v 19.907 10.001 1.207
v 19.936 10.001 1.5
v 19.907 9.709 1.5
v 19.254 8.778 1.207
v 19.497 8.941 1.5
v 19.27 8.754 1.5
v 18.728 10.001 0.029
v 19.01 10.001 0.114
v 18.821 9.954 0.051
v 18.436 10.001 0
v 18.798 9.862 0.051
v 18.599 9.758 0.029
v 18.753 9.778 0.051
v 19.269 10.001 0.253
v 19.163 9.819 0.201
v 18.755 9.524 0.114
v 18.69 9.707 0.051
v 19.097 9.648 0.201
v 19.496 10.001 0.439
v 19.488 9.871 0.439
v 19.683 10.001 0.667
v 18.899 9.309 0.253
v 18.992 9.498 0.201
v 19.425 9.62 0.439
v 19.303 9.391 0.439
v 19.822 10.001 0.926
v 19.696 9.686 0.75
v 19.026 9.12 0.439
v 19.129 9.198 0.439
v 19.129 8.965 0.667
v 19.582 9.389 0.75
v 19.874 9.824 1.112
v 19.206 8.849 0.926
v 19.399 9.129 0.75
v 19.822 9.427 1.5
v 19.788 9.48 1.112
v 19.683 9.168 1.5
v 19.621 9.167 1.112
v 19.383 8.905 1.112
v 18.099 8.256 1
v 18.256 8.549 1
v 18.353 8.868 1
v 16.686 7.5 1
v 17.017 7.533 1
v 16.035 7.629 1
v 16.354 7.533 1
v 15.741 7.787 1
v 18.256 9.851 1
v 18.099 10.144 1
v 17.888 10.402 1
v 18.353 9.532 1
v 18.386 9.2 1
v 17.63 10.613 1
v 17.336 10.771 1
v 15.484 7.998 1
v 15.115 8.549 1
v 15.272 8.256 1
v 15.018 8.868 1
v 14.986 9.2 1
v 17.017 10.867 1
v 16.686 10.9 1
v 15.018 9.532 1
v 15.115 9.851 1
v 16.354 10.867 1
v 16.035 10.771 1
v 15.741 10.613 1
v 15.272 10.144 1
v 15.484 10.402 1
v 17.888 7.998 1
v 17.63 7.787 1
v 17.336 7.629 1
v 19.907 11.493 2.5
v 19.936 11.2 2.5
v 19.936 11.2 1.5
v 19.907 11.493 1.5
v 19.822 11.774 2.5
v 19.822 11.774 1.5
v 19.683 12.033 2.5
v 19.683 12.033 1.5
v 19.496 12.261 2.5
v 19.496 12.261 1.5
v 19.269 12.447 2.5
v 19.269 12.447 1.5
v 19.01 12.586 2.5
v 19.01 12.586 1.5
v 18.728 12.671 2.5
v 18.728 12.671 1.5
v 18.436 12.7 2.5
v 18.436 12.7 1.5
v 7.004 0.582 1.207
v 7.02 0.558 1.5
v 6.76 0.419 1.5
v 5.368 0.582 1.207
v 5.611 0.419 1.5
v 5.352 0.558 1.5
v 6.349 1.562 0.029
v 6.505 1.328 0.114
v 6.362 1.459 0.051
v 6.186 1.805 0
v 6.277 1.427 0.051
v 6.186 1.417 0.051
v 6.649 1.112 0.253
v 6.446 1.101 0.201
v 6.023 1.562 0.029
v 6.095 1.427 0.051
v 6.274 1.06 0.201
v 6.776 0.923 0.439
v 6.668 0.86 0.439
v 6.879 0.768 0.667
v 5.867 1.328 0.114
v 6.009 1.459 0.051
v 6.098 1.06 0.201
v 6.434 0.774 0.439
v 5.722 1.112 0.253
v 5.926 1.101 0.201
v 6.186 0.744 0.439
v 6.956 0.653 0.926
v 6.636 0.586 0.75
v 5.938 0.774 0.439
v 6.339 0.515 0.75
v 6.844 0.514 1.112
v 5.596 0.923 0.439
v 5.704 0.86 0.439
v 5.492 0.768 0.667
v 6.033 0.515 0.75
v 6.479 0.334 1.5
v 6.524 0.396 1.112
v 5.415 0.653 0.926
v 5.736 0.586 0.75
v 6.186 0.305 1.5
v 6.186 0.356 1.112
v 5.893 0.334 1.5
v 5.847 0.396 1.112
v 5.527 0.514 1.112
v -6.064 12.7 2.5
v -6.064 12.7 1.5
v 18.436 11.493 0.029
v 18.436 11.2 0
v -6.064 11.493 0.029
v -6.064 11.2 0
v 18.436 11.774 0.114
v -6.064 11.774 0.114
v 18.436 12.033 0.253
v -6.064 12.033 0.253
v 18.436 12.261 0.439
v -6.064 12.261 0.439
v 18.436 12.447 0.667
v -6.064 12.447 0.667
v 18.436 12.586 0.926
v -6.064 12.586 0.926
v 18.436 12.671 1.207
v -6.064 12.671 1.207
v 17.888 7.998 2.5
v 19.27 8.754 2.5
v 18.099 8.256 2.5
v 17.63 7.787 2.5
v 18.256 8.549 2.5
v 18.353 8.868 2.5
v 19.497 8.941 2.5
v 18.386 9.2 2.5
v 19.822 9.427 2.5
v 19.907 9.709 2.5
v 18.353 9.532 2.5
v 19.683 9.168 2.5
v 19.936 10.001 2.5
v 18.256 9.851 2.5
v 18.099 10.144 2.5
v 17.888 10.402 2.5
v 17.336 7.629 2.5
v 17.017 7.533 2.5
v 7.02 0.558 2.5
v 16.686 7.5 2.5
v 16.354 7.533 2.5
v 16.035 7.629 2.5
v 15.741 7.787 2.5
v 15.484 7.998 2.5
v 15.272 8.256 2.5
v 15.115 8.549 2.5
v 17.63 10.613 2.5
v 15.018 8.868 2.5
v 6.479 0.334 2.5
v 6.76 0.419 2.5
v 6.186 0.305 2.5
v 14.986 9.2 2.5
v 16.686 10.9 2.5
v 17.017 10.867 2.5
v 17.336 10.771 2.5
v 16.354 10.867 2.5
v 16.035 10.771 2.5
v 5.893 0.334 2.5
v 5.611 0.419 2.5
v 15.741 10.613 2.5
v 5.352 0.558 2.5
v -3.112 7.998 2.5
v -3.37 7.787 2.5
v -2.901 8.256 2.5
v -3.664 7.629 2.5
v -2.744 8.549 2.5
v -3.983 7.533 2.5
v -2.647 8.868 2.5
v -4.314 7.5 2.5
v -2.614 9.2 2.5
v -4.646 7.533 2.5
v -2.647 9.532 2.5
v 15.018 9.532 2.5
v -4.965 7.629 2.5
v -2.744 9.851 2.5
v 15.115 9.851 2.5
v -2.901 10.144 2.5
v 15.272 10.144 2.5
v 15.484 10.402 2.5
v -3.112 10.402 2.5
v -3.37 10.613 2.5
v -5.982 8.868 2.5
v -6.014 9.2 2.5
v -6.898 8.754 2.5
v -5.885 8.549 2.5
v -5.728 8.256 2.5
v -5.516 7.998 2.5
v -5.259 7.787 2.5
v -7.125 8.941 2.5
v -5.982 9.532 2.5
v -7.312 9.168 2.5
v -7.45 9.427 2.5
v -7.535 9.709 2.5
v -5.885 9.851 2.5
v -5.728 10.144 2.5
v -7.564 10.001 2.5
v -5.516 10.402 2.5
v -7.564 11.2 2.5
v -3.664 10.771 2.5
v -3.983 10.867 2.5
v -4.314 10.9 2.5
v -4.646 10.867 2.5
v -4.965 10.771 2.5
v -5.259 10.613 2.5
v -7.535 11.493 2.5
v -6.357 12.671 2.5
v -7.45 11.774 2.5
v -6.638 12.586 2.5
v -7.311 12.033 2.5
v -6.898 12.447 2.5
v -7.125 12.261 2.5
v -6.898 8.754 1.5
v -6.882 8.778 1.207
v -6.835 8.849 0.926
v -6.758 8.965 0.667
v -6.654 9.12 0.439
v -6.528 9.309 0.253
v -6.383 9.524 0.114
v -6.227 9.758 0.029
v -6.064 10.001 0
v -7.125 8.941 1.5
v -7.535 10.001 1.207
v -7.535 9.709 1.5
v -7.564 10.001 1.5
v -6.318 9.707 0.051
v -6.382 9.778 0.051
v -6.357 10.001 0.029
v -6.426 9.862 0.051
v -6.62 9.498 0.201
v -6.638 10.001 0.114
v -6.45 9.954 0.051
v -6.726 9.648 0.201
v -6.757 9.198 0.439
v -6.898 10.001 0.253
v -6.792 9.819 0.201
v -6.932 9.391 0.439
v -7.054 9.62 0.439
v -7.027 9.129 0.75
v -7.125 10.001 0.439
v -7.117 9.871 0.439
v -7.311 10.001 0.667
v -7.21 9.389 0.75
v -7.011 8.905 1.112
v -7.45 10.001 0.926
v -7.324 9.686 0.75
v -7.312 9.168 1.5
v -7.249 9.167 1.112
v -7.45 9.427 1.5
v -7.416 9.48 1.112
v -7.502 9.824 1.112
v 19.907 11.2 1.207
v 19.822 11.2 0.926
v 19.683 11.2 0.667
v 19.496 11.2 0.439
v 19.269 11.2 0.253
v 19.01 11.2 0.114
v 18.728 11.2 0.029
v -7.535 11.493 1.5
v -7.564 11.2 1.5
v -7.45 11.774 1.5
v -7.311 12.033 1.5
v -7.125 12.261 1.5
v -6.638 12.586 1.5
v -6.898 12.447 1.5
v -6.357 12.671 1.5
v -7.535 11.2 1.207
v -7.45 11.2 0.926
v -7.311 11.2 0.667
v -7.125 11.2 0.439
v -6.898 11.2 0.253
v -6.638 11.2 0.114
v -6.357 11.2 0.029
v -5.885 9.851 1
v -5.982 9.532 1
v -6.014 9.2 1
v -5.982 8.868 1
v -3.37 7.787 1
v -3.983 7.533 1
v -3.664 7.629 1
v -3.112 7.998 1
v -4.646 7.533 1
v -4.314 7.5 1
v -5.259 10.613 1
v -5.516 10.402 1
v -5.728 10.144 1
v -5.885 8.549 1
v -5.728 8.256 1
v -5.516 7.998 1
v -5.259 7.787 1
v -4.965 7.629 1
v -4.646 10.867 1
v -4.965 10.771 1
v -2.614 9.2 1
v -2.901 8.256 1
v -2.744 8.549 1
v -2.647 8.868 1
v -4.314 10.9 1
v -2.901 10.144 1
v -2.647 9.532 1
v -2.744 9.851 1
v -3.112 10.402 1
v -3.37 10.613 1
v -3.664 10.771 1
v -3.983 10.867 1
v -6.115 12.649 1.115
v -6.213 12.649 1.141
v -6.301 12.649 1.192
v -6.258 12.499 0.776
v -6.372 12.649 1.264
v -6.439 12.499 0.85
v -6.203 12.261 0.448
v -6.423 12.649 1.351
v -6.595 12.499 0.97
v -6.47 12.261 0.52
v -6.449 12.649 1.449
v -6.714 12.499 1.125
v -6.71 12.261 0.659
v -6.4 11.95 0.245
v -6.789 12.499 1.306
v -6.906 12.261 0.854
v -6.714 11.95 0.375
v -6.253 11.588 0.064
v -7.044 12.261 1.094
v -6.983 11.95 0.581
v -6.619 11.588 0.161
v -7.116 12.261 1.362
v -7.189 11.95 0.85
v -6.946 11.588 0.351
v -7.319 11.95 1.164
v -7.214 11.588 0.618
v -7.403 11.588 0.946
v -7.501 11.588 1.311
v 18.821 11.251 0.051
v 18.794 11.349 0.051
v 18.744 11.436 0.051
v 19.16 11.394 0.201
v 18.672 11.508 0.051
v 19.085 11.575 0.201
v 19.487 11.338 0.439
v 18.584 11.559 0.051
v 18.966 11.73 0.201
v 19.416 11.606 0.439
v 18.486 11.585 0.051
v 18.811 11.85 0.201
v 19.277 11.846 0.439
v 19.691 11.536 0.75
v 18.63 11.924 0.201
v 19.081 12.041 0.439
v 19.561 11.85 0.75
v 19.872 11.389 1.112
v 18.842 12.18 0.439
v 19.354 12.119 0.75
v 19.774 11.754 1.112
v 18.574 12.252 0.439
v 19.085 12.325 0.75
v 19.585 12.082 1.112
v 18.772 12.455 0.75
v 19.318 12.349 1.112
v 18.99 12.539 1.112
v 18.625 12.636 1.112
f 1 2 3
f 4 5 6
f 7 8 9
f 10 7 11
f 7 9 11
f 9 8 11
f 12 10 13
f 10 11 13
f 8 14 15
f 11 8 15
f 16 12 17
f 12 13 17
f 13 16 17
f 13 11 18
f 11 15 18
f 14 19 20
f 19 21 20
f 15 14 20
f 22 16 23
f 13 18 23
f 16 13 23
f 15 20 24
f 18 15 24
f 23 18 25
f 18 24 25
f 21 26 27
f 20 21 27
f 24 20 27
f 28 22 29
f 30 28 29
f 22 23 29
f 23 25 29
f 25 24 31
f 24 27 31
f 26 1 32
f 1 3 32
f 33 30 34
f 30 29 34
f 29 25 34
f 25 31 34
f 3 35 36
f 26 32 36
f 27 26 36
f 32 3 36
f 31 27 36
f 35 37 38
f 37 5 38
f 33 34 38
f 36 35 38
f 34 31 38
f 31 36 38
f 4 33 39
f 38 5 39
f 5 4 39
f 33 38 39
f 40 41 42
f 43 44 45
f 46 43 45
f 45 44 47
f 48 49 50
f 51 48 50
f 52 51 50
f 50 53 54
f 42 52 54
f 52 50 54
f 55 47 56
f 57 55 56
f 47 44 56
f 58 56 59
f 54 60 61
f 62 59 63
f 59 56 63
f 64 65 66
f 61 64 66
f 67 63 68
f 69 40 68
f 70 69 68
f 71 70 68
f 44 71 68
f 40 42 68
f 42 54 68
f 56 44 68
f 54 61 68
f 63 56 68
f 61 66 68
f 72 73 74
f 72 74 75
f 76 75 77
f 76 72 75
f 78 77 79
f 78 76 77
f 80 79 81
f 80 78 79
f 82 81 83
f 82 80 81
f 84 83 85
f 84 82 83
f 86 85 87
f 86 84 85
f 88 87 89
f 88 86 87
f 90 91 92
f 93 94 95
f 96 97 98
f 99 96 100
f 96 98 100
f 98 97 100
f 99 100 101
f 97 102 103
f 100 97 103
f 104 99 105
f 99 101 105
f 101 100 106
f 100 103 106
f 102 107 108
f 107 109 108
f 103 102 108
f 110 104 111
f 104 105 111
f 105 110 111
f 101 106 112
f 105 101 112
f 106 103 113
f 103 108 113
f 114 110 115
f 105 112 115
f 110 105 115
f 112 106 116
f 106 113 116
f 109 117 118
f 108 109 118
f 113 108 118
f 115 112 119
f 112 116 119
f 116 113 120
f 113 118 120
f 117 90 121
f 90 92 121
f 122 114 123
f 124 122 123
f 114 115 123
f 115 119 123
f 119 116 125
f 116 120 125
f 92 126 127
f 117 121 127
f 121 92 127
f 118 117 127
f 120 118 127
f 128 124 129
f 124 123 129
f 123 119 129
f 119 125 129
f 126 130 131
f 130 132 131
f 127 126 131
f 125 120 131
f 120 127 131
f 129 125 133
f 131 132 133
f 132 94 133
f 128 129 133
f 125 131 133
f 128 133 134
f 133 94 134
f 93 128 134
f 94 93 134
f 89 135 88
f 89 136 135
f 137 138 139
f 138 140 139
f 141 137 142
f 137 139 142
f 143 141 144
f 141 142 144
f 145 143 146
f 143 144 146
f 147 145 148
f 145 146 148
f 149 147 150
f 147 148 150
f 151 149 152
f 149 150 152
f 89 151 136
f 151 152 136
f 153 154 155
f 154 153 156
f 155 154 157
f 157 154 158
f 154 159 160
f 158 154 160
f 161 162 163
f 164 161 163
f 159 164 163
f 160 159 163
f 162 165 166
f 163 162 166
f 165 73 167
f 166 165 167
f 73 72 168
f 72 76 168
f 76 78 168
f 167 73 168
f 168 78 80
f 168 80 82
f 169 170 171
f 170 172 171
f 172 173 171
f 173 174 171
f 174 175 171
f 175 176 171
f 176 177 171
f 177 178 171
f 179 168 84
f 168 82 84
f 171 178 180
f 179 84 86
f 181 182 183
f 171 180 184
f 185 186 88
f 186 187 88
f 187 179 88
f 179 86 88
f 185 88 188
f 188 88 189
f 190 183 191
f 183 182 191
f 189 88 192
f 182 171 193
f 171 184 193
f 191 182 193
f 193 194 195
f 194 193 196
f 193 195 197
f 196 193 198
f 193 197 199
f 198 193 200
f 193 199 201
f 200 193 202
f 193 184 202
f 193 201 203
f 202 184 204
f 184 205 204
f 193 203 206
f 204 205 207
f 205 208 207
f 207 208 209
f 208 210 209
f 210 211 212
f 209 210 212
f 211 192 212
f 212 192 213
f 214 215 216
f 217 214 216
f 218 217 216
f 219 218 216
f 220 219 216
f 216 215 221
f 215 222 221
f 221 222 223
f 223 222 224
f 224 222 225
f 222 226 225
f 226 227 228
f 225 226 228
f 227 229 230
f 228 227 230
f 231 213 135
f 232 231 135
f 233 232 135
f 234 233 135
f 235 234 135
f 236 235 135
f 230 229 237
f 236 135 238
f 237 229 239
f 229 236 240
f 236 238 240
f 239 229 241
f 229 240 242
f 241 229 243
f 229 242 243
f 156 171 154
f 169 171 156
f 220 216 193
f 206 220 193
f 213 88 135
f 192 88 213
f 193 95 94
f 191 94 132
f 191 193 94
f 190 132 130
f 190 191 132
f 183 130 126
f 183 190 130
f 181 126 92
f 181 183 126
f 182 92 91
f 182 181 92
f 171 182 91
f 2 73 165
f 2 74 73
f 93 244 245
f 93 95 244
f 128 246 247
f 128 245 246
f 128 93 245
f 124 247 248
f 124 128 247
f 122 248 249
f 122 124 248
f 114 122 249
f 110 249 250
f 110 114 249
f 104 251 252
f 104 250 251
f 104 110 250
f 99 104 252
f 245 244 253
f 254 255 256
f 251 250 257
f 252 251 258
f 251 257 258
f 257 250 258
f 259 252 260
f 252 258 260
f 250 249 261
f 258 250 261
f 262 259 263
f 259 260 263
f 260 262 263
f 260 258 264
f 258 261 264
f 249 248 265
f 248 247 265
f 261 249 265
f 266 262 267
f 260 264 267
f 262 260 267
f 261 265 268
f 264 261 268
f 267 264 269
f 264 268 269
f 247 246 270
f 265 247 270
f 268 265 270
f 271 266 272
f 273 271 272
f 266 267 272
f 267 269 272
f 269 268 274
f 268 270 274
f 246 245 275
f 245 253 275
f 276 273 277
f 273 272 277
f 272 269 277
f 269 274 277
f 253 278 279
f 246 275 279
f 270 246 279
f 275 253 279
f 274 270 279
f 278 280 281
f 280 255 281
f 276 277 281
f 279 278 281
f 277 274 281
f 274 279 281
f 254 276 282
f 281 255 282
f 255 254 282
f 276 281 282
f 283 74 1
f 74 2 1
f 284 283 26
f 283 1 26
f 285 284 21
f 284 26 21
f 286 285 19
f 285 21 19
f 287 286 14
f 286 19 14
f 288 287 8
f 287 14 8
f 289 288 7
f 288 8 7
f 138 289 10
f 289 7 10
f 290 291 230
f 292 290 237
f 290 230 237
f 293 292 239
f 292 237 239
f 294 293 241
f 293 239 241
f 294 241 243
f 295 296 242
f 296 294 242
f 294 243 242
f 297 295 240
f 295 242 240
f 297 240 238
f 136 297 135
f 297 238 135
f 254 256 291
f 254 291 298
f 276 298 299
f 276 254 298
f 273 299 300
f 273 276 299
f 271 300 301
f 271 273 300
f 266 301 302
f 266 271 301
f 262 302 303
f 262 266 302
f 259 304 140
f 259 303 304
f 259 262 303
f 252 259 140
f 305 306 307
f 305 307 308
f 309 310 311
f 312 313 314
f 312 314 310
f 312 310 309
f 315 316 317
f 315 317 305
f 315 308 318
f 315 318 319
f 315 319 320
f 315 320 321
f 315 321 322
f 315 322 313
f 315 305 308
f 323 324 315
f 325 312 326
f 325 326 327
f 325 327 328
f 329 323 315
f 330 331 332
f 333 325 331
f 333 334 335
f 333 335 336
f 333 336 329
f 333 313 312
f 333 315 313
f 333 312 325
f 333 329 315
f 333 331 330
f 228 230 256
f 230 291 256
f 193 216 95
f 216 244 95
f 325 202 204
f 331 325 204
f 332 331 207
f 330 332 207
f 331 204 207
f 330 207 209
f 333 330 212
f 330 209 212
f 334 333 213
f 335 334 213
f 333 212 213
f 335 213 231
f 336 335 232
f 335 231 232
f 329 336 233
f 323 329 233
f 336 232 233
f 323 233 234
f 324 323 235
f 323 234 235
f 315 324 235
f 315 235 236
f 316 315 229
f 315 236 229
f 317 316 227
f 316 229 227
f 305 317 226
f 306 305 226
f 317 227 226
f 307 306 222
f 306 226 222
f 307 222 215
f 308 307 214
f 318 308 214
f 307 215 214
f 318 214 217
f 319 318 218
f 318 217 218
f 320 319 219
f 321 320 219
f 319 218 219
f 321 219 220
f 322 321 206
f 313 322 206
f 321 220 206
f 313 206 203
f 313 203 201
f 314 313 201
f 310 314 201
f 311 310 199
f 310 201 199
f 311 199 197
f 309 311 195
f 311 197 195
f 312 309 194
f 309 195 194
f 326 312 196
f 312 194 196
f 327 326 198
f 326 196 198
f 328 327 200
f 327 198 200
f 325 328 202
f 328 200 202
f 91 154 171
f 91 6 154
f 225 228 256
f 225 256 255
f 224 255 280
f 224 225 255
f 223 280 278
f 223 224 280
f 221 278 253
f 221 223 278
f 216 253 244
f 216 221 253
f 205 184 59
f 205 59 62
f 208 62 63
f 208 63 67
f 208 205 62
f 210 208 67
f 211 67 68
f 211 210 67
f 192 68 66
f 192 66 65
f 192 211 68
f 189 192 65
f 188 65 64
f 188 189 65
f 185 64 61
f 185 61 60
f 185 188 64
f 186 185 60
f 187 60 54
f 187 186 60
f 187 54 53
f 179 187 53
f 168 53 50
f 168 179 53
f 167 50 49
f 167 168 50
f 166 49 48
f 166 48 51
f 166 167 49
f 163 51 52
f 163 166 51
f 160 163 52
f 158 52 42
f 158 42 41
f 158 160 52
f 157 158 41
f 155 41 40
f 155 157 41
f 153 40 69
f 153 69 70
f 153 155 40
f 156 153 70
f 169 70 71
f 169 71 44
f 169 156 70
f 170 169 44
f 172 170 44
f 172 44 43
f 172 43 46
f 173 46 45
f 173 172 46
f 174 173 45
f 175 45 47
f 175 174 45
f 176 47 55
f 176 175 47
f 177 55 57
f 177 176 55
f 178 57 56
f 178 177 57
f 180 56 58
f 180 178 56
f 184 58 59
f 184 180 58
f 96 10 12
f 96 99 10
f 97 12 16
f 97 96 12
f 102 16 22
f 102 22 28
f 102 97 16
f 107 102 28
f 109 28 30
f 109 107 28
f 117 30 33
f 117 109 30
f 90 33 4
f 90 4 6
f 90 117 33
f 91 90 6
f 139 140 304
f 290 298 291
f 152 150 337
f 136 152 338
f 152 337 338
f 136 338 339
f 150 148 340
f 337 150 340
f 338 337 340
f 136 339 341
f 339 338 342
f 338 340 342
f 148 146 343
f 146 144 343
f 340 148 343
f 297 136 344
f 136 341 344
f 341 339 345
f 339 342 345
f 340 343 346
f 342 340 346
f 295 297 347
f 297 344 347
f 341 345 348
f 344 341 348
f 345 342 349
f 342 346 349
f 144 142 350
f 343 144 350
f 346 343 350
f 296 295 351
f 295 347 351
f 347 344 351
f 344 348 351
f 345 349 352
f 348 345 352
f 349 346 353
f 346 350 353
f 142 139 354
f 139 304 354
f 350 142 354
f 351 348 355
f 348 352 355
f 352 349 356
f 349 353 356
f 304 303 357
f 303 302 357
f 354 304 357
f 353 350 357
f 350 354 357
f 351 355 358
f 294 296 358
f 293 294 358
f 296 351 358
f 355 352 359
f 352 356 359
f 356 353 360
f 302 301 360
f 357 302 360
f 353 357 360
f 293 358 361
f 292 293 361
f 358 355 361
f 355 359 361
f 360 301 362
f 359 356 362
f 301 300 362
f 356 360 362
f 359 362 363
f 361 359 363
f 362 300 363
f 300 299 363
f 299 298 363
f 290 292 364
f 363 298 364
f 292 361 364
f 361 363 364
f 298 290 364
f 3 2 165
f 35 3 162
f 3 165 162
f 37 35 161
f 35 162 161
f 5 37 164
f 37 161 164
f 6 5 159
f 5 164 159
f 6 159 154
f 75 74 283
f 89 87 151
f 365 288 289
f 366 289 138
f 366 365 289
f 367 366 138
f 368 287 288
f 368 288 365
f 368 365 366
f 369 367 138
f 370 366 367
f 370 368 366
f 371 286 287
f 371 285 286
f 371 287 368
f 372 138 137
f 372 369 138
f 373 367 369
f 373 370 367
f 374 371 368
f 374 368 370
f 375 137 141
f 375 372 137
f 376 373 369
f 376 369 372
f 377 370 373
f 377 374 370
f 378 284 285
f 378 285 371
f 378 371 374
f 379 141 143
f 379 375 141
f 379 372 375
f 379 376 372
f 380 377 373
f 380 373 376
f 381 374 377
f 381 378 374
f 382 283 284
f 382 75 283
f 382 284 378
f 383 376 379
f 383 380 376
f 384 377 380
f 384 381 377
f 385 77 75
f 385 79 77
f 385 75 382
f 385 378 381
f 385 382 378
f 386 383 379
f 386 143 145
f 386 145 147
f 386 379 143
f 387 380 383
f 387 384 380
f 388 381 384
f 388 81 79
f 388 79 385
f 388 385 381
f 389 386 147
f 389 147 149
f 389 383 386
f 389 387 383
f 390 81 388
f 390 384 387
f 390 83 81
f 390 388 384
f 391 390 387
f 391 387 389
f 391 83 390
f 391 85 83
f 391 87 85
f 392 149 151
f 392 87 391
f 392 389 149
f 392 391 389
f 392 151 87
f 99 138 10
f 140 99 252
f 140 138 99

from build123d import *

# Parameters (mm, degrees)
BOSS_EXTRUDE1_DEPTH = 2.5
SKETCH2_R           = 1.7
CUT_EXTRUDE1_DEPTH  = 1.5
FILLET1_R           = 1.5


with BuildPart() as part:
    # Sketch1 → Boss-Extrude1 (new body)
    with BuildSketch(Plane.XY):
        Polygon((-7.56419618, 12.7), (-7.56419618, 9.2), (6.18580382, 0), (6.18580382, 12.7), align=None)
    extrude(amount=BOSS_EXTRUDE1_DEPTH)

    # Sketch2 → Cut-Extrude1 (cut)
    with BuildSketch(Plane.XY.offset(2.5)):
        with Locations((-4.31419618, 9.2)):
            Circle(SKETCH2_R)
    extrude(amount=-CUT_EXTRUDE1_DEPTH, mode=Mode.SUBTRACT)

    # Mirror2: part across plane


with BuildPart() as part_1:
    add(part.part)
    add(part.part.mirror(Plane(origin=(6.18580382, 0, 2.5), x_dir=(0, 0, 1), z_dir=(-1, 0, 0))))

    # Fillet1
    fillet1_edges = [part_1.edges().sort_by_distance(p)[0] for p in [
        (19.93580382, 12.7, 1.25),
        (19.93580382, 9.2, 1.25),
        (6.18580382, 0, 1.25),
        (19.93580382, 10.95, 0),
        (13.06080382, 4.6, 0),
        (-0.68919618, 4.6, 0),
        (-7.56419618, 10.95, 0),
        (6.18580382, 12.7, 0),
        (-7.56419618, 9.2, 1.25),
        (-7.56419618, 12.7, 1.25),
    ]]
    fillet(fillet1_edges, radius=FILLET1_R)


solid = part_1.part
